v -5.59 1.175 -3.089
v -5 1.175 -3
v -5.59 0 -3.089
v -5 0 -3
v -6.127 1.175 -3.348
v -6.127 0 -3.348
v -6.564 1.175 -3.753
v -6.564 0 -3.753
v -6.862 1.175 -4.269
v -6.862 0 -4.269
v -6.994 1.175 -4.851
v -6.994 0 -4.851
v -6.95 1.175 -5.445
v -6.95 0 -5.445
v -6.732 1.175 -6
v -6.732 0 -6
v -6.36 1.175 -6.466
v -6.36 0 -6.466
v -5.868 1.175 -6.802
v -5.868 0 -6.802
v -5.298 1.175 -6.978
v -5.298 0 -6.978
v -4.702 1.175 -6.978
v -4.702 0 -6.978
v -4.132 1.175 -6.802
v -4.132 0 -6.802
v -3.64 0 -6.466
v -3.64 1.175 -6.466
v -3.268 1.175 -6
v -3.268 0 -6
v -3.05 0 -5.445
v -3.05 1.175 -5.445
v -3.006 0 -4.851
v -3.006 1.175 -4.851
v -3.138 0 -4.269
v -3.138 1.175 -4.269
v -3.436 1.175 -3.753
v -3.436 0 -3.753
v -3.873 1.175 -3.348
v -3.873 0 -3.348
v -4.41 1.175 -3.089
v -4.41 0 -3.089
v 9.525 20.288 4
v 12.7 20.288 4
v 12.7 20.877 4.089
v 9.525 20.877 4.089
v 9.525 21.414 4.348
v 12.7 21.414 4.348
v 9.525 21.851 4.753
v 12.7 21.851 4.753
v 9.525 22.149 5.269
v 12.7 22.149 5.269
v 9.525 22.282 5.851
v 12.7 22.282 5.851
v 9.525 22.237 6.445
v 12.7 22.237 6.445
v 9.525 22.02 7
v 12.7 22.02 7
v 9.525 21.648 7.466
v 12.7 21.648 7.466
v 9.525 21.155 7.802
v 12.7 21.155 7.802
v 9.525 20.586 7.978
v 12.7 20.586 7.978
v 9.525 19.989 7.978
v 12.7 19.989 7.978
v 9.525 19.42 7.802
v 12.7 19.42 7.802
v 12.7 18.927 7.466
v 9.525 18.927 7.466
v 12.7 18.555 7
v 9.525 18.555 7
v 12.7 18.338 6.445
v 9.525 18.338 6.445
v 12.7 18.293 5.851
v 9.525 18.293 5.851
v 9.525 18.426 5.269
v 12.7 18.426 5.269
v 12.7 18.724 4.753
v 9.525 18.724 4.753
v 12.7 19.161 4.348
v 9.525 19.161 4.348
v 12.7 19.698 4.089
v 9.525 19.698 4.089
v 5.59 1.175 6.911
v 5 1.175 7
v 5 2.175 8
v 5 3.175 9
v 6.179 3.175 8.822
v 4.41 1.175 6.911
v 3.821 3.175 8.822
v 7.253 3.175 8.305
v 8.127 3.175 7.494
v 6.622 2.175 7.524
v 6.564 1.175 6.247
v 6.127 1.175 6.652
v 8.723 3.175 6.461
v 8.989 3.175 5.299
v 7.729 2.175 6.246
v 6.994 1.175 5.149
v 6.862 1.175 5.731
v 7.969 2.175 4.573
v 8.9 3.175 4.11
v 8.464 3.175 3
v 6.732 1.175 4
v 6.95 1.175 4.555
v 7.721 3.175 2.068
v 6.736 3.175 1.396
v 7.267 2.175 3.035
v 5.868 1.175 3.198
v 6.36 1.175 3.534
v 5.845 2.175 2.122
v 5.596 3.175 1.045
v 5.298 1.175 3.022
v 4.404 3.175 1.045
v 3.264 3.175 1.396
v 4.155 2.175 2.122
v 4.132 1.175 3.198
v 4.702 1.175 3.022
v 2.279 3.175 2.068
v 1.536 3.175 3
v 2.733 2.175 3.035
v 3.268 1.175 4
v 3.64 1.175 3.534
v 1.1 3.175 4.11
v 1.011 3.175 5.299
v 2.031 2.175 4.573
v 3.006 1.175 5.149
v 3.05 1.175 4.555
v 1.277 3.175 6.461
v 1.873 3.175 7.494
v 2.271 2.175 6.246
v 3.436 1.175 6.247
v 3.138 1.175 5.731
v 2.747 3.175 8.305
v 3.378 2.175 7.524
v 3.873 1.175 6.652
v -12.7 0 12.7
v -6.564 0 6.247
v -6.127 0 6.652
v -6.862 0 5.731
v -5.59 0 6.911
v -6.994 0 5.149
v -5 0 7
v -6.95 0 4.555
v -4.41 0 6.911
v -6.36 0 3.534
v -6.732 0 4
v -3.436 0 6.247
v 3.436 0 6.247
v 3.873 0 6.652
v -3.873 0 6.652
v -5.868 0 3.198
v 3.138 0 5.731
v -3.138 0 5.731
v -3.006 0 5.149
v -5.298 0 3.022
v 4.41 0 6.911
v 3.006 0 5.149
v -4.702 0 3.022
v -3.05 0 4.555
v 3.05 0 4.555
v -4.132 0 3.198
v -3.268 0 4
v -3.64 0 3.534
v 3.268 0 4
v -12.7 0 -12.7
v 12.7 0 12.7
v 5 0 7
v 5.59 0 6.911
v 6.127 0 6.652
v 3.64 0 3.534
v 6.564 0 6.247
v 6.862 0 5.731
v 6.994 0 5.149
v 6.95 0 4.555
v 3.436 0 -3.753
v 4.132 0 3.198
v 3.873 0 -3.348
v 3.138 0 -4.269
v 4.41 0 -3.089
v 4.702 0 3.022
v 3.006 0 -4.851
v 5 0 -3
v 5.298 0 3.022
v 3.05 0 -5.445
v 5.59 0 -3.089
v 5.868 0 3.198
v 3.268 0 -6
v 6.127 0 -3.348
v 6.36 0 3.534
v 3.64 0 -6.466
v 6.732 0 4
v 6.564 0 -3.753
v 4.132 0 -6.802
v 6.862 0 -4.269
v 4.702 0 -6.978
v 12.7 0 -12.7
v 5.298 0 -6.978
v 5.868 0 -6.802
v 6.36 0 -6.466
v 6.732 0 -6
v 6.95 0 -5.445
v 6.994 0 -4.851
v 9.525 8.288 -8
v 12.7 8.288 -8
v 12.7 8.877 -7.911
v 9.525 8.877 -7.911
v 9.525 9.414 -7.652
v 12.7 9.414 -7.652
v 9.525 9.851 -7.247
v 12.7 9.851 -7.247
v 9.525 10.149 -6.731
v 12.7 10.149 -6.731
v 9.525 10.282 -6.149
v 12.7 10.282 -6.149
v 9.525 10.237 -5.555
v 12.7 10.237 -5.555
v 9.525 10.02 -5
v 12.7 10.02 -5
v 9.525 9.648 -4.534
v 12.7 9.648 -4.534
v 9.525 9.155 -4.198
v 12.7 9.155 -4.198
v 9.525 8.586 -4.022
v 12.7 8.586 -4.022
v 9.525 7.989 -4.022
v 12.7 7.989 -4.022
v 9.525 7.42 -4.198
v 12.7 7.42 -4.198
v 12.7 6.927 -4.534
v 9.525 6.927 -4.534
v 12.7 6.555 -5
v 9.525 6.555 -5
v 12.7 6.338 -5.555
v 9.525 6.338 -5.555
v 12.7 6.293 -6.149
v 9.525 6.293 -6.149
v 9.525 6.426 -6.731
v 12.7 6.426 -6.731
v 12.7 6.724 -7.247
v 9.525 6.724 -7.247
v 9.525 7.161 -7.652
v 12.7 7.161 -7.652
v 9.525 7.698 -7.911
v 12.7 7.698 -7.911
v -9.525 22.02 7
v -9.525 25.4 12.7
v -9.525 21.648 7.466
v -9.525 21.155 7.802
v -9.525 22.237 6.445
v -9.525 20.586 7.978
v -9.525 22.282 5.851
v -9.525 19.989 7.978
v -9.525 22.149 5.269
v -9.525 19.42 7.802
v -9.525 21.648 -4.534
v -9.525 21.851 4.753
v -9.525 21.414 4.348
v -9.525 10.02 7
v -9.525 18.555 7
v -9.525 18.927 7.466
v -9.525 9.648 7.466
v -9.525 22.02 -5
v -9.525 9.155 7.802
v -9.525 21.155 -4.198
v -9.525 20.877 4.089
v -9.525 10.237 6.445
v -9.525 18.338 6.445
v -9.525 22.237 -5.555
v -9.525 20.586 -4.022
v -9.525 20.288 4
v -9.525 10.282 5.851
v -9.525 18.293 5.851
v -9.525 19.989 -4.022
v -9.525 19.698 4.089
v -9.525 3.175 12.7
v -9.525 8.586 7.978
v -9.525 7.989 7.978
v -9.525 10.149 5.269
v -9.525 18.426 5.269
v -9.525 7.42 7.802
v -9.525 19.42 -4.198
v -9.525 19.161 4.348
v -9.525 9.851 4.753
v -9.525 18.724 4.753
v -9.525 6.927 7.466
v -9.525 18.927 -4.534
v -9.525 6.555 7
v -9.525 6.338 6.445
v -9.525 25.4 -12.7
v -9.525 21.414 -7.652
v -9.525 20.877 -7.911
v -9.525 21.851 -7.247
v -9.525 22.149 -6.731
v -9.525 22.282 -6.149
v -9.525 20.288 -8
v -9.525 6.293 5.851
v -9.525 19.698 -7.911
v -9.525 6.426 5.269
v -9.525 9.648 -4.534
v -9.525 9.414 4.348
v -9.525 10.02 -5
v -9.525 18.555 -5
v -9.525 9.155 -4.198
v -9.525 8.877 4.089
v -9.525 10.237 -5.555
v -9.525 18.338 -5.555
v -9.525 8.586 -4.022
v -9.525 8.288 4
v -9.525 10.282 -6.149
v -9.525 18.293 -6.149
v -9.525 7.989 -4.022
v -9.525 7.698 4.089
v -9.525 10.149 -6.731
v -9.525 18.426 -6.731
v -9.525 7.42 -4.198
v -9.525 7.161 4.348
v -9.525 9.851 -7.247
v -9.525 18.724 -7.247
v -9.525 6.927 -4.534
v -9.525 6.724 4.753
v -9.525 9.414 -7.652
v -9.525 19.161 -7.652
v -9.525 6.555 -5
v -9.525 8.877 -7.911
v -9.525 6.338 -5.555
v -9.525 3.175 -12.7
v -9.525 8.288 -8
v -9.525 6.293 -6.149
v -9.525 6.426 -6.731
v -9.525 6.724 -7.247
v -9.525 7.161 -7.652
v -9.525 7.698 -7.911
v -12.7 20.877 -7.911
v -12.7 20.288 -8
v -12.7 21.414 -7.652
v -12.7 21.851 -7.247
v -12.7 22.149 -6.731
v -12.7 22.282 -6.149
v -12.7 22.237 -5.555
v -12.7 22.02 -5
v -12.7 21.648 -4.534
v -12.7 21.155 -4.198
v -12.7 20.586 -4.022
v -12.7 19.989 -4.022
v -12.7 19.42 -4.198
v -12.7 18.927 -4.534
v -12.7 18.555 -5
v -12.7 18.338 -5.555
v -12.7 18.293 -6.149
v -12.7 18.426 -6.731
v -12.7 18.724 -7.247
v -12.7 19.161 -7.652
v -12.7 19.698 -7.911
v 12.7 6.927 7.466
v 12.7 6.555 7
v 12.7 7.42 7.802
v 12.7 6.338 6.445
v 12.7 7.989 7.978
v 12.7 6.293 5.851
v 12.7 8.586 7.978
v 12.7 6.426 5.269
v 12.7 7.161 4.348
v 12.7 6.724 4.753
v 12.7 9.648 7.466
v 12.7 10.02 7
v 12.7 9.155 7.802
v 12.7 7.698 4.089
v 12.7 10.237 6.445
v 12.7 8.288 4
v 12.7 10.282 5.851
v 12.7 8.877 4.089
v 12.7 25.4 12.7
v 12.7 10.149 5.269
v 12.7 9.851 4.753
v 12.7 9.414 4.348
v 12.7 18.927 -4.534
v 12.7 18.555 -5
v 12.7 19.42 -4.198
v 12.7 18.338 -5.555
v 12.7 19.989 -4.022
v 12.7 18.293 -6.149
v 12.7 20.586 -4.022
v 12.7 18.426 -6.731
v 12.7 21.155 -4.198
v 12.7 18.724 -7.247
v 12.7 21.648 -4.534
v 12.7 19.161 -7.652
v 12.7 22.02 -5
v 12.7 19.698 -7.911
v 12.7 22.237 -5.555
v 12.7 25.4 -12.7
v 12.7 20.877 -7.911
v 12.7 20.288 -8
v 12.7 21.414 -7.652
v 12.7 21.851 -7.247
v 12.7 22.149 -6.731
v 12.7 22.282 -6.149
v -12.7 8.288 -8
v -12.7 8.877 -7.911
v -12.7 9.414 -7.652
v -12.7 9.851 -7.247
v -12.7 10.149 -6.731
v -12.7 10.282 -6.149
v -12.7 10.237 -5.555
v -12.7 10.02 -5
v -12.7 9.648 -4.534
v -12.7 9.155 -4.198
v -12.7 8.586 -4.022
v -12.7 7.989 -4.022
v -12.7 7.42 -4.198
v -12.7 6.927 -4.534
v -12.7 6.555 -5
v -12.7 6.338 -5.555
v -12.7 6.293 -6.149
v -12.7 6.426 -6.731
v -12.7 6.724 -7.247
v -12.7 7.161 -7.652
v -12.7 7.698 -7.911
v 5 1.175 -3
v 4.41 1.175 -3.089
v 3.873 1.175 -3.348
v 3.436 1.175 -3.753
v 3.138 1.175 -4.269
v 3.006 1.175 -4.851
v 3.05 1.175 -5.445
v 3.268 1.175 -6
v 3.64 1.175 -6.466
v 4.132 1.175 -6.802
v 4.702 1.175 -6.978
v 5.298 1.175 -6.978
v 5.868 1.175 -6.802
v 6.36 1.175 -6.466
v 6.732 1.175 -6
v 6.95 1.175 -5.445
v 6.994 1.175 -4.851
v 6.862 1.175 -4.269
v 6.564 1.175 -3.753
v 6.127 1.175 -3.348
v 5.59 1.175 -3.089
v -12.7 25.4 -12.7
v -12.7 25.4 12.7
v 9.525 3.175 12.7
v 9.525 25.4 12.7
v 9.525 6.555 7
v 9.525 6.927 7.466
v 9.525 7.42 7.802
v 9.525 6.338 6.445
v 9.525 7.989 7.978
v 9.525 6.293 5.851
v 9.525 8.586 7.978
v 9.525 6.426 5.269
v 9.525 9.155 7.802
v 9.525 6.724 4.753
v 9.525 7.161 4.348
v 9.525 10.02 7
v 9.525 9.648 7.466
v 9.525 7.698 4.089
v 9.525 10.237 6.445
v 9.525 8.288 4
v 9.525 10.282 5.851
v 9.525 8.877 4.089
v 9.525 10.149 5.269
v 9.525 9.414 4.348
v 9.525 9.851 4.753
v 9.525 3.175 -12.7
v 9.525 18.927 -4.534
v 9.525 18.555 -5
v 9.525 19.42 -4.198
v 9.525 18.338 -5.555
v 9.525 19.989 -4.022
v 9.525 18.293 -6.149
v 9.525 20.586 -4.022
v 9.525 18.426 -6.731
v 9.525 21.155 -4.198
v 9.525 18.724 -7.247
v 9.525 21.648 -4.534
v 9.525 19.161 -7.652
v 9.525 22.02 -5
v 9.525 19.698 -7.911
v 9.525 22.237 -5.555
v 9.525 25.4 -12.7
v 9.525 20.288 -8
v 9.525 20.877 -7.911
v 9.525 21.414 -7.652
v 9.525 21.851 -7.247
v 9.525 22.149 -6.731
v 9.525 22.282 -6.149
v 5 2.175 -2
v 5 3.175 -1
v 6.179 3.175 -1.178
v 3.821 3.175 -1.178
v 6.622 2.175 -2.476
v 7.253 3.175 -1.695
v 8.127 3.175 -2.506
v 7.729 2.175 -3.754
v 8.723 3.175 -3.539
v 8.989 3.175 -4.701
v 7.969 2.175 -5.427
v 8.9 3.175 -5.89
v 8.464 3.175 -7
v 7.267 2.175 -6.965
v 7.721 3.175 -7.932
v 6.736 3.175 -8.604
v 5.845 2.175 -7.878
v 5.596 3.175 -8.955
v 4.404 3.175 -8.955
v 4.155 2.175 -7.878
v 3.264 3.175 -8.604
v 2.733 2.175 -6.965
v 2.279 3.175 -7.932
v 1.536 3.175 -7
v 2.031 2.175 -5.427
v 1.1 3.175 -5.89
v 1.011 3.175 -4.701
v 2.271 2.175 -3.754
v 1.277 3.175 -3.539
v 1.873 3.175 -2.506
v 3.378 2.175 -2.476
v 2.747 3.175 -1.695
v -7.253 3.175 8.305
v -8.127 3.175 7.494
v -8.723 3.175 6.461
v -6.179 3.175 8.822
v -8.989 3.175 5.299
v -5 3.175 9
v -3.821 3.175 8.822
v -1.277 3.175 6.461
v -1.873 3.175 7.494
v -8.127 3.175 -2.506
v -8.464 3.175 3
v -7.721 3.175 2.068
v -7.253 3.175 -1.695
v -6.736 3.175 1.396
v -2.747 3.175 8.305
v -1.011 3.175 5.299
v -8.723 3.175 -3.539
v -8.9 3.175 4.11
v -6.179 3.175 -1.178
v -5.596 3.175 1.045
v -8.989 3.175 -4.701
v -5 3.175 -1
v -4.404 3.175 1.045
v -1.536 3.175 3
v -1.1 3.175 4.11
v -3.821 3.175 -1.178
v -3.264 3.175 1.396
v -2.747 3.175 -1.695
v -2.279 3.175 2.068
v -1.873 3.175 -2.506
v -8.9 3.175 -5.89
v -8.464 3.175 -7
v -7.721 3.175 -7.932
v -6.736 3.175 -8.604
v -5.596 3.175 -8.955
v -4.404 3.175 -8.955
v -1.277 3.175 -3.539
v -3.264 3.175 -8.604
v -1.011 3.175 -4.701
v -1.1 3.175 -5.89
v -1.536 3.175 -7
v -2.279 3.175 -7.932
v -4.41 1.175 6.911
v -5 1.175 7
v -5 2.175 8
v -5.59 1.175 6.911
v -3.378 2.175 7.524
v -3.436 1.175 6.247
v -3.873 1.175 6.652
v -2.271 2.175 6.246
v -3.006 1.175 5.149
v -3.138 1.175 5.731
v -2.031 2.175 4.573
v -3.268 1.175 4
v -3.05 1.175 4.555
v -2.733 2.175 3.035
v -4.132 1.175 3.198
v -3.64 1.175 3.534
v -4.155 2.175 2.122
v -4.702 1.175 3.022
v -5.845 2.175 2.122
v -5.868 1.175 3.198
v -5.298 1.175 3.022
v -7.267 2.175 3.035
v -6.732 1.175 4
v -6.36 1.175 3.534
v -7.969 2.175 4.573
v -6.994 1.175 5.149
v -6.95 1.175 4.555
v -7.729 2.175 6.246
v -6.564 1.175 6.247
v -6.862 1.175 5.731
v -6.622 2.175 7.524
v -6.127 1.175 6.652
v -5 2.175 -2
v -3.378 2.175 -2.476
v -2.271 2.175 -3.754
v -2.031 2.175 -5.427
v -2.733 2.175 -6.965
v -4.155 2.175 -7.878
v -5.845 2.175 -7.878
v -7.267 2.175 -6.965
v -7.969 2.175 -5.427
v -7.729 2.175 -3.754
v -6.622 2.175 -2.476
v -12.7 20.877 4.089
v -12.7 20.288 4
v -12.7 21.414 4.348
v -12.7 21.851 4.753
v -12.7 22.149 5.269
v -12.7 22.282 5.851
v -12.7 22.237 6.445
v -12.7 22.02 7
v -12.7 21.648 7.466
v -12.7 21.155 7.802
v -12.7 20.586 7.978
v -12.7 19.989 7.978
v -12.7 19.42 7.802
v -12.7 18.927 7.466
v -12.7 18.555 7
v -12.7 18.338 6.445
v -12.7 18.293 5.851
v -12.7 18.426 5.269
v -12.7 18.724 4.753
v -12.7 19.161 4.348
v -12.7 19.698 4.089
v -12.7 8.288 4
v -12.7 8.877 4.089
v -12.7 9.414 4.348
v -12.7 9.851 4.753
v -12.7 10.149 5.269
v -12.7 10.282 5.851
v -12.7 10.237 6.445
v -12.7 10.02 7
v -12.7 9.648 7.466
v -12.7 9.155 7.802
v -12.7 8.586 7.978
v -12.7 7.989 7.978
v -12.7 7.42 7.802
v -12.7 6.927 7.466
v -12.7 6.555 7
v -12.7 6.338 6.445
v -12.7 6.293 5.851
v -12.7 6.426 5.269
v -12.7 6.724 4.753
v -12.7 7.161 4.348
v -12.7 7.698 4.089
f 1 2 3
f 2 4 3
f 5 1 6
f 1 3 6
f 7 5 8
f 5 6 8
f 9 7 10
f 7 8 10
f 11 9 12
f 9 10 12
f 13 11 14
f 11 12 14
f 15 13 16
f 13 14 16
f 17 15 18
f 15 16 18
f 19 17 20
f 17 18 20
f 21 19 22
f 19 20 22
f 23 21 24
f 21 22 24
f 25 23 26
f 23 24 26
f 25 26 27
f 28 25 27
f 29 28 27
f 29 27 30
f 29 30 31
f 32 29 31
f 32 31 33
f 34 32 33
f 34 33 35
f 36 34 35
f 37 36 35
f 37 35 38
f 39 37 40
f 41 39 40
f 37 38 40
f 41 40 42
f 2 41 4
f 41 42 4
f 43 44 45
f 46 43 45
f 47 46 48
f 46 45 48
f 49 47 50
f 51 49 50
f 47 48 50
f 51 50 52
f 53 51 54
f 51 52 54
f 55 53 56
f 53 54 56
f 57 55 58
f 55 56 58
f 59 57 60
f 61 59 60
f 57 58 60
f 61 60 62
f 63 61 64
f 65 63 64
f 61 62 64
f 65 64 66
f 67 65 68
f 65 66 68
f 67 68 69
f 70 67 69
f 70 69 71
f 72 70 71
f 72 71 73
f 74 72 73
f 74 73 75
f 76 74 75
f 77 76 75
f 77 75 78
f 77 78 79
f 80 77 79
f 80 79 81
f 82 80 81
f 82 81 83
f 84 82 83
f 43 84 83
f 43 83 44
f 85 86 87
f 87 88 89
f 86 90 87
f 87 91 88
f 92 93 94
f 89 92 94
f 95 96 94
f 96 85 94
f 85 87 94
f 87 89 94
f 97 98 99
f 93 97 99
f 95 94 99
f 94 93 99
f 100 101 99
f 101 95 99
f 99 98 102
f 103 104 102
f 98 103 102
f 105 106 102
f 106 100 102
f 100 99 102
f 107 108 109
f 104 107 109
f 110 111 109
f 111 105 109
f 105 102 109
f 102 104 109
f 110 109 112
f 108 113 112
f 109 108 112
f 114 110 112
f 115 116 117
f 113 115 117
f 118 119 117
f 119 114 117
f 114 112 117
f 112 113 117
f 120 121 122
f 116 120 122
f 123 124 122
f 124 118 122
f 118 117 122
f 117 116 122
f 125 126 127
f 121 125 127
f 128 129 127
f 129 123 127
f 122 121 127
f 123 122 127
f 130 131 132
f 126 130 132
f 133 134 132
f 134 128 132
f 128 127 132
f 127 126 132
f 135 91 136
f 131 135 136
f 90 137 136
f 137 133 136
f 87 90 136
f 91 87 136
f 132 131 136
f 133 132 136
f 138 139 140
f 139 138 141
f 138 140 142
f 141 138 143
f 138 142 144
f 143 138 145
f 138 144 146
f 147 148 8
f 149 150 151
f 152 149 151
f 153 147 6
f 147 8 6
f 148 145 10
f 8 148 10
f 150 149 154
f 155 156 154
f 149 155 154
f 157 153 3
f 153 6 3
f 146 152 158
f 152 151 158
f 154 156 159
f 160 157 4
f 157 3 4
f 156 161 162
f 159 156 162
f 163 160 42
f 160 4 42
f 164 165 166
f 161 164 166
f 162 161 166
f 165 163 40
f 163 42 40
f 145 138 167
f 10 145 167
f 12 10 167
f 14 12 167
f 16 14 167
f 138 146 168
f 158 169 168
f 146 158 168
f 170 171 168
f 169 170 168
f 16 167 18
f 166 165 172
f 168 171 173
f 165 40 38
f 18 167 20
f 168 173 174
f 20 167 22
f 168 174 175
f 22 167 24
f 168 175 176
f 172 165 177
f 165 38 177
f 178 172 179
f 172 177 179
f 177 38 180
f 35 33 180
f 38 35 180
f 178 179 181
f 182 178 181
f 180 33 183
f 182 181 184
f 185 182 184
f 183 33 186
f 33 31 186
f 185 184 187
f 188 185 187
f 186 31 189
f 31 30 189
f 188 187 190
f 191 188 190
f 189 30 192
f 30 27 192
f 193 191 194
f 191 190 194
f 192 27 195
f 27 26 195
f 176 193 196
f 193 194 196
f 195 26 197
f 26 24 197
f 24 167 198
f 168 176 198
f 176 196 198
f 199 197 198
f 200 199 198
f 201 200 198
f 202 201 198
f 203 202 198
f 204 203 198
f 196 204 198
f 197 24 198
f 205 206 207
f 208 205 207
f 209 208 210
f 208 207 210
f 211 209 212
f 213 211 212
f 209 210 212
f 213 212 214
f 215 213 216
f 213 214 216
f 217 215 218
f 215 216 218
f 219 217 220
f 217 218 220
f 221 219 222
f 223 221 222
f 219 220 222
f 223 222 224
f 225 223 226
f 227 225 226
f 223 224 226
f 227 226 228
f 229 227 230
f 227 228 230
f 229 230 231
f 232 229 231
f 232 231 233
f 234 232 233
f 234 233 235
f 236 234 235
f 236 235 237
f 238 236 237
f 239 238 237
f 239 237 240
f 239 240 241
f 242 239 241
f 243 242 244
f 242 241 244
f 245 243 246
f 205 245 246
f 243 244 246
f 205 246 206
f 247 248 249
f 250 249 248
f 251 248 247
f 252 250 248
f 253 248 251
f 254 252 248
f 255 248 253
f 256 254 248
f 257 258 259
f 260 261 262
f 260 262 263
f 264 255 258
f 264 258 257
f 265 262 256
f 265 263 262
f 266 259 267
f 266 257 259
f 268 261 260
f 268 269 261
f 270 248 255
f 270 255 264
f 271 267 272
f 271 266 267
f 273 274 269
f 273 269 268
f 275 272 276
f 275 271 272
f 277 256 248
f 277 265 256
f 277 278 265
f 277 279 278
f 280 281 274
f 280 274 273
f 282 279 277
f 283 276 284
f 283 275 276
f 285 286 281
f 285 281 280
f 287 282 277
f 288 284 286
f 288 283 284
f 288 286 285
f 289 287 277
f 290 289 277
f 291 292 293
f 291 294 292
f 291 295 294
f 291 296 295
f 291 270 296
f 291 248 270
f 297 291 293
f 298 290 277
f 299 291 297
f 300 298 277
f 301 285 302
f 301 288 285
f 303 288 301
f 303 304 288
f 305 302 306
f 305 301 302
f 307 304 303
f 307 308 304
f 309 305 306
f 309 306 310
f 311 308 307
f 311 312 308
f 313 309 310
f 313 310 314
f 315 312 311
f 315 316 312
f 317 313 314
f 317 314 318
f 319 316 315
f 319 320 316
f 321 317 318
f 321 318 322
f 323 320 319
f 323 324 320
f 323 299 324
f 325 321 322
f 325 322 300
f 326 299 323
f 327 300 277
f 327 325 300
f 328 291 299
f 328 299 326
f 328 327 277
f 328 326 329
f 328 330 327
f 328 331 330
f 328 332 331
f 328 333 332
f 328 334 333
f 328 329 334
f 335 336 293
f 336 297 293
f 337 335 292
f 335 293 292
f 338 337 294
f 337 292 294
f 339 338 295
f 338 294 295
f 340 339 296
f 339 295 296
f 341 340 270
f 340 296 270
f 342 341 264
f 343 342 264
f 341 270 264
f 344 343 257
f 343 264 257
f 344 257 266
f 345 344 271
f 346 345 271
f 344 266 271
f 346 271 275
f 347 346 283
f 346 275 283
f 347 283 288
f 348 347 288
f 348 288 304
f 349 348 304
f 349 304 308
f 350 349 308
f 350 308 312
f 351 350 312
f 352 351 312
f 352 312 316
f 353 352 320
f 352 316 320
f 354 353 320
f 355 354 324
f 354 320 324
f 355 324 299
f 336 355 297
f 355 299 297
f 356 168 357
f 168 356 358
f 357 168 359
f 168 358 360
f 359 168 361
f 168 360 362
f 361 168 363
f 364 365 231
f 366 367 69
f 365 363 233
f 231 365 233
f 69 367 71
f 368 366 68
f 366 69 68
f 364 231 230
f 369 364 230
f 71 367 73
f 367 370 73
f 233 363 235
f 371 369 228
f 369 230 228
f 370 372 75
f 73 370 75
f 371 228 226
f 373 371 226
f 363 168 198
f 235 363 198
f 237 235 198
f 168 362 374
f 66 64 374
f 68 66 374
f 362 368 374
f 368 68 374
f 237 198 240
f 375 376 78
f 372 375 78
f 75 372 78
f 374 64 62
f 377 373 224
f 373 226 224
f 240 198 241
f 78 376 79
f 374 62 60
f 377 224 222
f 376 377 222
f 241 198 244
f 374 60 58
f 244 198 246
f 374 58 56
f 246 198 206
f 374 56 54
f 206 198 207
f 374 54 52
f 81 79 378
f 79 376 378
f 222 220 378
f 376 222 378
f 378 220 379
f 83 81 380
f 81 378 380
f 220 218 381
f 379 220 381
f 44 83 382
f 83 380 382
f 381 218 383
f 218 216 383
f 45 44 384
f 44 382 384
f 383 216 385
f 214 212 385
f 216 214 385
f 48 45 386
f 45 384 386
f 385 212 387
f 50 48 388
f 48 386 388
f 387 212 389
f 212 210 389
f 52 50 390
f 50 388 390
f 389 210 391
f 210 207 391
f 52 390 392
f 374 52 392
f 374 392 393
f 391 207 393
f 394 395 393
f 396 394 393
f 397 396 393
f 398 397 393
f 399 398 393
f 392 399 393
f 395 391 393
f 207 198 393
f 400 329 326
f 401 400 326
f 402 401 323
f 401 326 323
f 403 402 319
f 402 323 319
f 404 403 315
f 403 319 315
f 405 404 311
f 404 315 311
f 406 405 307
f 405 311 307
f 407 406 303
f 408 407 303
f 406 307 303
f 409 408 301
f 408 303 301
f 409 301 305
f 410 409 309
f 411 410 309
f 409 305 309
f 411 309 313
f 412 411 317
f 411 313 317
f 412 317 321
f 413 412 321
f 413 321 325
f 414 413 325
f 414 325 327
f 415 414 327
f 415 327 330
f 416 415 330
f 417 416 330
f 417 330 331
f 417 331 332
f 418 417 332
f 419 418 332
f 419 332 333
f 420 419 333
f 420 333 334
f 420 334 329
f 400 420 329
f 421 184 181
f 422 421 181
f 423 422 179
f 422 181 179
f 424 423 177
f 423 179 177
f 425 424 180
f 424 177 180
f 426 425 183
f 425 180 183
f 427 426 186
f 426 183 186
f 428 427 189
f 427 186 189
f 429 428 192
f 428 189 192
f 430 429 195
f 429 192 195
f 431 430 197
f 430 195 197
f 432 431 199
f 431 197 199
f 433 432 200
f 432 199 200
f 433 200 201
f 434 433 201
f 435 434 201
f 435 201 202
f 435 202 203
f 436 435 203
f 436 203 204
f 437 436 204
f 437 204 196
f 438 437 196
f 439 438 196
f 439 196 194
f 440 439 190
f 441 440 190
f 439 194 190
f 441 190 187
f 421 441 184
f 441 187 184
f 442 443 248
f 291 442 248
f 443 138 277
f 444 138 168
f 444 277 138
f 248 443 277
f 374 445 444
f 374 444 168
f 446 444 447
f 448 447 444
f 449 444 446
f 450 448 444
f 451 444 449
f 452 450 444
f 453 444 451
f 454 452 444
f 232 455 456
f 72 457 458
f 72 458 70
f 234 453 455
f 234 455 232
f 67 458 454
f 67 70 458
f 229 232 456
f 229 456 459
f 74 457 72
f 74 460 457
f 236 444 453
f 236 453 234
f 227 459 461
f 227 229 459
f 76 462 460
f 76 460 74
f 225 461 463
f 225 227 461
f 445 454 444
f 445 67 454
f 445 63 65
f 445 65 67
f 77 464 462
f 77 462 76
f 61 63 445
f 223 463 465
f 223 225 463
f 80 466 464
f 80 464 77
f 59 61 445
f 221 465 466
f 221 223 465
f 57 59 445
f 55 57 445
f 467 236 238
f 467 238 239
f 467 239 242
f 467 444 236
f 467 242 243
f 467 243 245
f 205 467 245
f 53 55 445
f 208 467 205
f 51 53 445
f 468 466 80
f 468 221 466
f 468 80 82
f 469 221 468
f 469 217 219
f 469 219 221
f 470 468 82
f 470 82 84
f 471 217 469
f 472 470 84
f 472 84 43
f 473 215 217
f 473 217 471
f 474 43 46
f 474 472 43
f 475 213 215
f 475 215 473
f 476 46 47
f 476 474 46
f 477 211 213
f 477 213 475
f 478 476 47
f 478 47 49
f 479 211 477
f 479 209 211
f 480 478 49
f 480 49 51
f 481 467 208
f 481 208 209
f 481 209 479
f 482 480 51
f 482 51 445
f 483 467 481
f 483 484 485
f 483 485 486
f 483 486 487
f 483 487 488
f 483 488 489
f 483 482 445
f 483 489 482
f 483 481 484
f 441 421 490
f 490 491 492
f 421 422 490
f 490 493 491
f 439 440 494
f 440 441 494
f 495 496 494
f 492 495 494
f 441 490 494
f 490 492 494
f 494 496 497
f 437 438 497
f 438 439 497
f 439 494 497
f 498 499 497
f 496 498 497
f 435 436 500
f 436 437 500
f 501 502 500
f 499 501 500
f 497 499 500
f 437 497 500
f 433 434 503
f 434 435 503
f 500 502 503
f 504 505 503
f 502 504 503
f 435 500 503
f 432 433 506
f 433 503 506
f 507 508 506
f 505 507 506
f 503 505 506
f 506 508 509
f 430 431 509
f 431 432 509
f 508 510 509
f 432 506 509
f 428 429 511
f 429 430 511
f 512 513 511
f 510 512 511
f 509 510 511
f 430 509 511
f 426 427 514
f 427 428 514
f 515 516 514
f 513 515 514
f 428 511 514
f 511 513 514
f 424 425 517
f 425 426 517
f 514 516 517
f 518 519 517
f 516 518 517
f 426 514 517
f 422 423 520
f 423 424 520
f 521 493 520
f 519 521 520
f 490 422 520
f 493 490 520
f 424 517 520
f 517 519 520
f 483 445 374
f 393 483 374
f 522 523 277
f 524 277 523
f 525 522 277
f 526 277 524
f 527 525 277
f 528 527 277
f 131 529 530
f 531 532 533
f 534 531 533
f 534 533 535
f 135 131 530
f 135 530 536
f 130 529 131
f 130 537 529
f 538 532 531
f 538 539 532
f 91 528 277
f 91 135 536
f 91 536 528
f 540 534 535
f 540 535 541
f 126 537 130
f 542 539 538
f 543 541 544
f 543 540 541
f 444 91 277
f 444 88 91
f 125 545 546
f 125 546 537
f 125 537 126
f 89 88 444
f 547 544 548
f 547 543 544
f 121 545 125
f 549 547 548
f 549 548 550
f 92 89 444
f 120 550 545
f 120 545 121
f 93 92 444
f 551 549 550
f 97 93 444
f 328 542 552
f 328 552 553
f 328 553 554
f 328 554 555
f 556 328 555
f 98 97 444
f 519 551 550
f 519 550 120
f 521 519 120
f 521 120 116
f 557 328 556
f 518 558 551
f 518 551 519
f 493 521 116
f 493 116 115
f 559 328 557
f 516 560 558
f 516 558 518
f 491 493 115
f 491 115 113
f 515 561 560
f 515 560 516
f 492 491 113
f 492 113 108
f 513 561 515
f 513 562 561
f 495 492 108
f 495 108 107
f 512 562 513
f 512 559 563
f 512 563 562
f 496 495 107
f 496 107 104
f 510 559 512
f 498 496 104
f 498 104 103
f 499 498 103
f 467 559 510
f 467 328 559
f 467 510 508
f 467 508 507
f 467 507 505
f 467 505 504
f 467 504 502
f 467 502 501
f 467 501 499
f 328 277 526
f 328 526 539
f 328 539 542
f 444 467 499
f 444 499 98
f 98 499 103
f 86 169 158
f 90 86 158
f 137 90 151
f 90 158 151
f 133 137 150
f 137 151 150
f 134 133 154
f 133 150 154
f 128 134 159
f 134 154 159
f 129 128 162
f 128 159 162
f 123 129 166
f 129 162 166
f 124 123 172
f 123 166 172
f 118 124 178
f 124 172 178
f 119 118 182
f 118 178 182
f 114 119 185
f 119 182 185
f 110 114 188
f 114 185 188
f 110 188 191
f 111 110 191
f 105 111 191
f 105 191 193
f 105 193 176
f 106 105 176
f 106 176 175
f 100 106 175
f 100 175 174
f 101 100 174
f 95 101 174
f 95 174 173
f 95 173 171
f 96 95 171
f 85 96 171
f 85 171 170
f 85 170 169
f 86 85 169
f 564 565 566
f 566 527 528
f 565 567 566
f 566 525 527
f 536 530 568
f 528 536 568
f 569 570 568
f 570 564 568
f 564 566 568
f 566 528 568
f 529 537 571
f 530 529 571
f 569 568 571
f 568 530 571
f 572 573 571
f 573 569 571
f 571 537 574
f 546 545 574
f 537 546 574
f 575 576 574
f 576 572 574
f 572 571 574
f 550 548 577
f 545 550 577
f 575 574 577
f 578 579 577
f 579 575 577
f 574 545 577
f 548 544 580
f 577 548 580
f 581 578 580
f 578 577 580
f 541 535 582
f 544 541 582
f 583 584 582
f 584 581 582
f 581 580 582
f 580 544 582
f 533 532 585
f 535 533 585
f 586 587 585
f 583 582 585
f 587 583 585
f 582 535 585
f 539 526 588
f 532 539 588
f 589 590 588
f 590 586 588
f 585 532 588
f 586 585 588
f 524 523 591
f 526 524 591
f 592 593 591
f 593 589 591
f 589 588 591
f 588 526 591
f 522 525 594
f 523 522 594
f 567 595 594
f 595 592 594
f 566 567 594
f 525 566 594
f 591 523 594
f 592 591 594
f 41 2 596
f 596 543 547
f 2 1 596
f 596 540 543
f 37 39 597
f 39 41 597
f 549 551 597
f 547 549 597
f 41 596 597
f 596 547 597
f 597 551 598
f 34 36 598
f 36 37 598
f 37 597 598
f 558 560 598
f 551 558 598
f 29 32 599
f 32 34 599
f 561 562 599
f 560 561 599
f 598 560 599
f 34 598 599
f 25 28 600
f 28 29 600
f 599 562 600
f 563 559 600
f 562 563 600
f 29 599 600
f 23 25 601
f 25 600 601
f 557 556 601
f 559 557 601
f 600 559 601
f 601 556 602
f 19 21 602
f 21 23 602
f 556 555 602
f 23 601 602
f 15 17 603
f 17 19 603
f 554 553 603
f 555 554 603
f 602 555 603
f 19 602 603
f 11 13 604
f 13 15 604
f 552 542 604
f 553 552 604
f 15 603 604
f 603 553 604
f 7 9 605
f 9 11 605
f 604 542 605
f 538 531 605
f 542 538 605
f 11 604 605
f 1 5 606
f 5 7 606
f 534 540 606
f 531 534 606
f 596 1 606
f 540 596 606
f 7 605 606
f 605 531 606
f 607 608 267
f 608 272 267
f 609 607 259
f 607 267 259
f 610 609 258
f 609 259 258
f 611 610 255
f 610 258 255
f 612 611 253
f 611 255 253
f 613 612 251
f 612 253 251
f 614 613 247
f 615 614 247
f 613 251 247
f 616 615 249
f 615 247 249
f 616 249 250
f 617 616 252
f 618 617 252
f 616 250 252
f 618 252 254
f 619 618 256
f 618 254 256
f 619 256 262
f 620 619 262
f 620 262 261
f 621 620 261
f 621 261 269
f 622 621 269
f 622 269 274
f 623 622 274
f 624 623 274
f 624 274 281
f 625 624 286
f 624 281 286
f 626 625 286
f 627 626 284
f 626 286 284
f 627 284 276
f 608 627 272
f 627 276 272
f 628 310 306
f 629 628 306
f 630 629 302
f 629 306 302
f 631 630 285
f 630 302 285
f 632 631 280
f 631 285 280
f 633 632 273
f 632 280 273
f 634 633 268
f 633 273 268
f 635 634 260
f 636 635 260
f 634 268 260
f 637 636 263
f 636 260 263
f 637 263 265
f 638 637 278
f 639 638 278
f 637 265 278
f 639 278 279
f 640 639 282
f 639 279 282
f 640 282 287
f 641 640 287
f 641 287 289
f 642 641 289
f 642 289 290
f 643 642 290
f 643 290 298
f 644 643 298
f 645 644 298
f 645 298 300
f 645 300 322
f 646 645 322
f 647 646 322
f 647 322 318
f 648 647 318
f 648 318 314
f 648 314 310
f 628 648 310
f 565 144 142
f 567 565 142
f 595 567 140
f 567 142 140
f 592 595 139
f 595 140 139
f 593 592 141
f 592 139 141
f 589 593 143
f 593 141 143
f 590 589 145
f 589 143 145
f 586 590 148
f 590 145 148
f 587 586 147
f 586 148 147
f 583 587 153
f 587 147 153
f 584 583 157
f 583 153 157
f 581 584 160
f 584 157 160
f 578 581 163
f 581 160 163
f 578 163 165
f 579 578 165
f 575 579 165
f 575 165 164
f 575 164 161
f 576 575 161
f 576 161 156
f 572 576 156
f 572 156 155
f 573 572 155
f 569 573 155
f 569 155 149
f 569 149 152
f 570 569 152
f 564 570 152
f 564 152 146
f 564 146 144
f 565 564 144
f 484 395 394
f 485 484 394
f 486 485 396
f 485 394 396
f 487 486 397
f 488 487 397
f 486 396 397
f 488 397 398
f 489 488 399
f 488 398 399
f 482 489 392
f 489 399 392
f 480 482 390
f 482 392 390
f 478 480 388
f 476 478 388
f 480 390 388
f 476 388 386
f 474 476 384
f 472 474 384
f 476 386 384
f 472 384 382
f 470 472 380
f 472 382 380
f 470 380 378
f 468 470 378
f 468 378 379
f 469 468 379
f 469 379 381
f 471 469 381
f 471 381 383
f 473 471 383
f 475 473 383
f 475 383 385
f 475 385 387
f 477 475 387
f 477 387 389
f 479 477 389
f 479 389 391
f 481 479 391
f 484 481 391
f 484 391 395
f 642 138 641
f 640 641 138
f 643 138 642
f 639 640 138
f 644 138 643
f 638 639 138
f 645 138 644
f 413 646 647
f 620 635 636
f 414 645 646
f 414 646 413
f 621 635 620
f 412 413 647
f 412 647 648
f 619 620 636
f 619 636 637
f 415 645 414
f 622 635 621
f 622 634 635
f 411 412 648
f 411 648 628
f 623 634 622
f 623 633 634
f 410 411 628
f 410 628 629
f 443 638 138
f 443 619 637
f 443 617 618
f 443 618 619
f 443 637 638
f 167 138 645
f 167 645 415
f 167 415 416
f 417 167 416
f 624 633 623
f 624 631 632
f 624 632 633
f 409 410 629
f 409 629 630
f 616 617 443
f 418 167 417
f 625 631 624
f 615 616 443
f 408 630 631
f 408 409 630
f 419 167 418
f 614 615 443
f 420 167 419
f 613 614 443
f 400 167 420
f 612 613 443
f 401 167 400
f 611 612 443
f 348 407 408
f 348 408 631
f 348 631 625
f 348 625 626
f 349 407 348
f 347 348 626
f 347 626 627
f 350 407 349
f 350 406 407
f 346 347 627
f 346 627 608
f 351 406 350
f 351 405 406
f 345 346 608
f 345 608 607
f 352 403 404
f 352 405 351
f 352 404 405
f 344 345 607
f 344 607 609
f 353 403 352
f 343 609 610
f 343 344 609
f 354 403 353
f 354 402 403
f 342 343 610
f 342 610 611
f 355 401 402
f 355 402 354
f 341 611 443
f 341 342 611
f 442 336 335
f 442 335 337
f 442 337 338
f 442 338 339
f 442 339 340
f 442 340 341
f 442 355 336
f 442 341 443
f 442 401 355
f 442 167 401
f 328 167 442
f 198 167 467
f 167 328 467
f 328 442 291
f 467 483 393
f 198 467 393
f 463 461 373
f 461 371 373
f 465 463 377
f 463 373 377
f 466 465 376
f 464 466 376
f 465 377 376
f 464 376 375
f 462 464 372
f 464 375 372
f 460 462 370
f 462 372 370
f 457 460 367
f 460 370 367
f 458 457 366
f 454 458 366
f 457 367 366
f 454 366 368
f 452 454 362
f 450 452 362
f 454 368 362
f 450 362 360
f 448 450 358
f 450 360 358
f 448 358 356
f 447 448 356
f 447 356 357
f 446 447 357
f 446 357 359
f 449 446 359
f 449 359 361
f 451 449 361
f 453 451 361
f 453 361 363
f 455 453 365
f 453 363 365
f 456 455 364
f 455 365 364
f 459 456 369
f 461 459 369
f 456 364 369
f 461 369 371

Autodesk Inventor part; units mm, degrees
ref_plane "YZ Plane" through (0, 0, 0) normal (1, 0, 0) x (0, 1, 0)
ref_plane "XZ Plane" through (0, 0, 0) normal (0, 1, 0) x (-1, 0, 0)
ref_plane "XY Plane" through (0, 0, 0) normal (0, 0, 1) x (1, 0, 0)
sketch "Sketch1" plane through (0, 0, 0) normal (0, 0, 1) x (1, 0, 0)
  line L0 (-12.7, 0) -> (12.7, 0)
  line L1 (-12.7, 0) -> (-12.7, 25.4)
  line L2 (12.7, 0) -> (12.7, 25.4)
  line L3 (-9.525, 25.4) -> (-9.525, 3.175)
  line L4 (-9.525, 3.175) -> (9.525, 3.175)
  line L5 (9.525, 3.175) -> (9.525, 25.4)
  line L6 (-12.7, 25.4) -> (-9.525, 25.4)
  line L7 (9.525, 25.4) -> (12.7, 25.4)
  point P0 (0, 0)
  point P1 (0, 0)
  dimension "d0" = 25.4
  dimension "d1" = 25.4
  dimension "d2" = 25.4
  dimension "d3" = 3.175
extrude "Extrusion1" add sketch "Sketch1" along normal mid plane 25.4
sketch "Sketch2" plane through (-9.525, 3.175, 12.7) normal (0, 1, 0) x (1, 0, 0)
  circle A0 centre (4.525, 17.7) radius 2
  circle A1 centre (4.525, 7.7) radius 2
  circle A2 centre (14.525, 7.7) radius 2
  circle A3 centre (14.525, 17.7) radius 2
  point P0 (9.525, 12.7)
  dimension "d6" = 4
  dimension "d7" = 5
  dimension "d8" = 5
  dimension "d11" = 360
hole "Hole1" at (-5, 3.175, 5) at (-5, 3.175, -5) at (5, 3.175, -5) at (5, 3.175, 5) direction (0, -1, 0) diameter 4 depth 3.175 countersink diameter 8 countersink angle 90
sketch "Sketch3" plane through (12.7, 0, 12.7) normal (1, 0, 0) x (0, 0, -1)
  line L0 (25.4, 3.175) -> (0, 3.175) construction
  line L1 (0, 25.4) -> (0, 3.175) construction
  line L2 (25.4, 25.4) -> (0, 25.4) construction
  line L3 (25.4, 3.175) -> (25.4, 25.4) construction
  line L4 (25.4, 25.4) -> (0, 25.4) construction
  line L5 (12.7, 25.4) -> (12.7, 3.175) construction
  circle A0 centre (6.7, 20.2875) radius 2
  circle A1 centre (6.7, 8.2875) radius 2
  circle A2 centre (18.7, 8.2875) radius 2
  circle A3 centre (18.7, 20.2875) radius 2
  line L6 (0, 14.2875) -> (25.4, 14.2875) construction
  point P0 (12.7, 0)
  point P1 (12.7, 14.2875)
  dimension "d20" = 4
  dimension "d21" = 6
  dimension "d22" = 6
  dimension "d25" = 360
extrude "Extrusion2" cut sketch "Sketch3" against normal through all
properties part number "Arashtrix 1in x 1in C-Bracket"
